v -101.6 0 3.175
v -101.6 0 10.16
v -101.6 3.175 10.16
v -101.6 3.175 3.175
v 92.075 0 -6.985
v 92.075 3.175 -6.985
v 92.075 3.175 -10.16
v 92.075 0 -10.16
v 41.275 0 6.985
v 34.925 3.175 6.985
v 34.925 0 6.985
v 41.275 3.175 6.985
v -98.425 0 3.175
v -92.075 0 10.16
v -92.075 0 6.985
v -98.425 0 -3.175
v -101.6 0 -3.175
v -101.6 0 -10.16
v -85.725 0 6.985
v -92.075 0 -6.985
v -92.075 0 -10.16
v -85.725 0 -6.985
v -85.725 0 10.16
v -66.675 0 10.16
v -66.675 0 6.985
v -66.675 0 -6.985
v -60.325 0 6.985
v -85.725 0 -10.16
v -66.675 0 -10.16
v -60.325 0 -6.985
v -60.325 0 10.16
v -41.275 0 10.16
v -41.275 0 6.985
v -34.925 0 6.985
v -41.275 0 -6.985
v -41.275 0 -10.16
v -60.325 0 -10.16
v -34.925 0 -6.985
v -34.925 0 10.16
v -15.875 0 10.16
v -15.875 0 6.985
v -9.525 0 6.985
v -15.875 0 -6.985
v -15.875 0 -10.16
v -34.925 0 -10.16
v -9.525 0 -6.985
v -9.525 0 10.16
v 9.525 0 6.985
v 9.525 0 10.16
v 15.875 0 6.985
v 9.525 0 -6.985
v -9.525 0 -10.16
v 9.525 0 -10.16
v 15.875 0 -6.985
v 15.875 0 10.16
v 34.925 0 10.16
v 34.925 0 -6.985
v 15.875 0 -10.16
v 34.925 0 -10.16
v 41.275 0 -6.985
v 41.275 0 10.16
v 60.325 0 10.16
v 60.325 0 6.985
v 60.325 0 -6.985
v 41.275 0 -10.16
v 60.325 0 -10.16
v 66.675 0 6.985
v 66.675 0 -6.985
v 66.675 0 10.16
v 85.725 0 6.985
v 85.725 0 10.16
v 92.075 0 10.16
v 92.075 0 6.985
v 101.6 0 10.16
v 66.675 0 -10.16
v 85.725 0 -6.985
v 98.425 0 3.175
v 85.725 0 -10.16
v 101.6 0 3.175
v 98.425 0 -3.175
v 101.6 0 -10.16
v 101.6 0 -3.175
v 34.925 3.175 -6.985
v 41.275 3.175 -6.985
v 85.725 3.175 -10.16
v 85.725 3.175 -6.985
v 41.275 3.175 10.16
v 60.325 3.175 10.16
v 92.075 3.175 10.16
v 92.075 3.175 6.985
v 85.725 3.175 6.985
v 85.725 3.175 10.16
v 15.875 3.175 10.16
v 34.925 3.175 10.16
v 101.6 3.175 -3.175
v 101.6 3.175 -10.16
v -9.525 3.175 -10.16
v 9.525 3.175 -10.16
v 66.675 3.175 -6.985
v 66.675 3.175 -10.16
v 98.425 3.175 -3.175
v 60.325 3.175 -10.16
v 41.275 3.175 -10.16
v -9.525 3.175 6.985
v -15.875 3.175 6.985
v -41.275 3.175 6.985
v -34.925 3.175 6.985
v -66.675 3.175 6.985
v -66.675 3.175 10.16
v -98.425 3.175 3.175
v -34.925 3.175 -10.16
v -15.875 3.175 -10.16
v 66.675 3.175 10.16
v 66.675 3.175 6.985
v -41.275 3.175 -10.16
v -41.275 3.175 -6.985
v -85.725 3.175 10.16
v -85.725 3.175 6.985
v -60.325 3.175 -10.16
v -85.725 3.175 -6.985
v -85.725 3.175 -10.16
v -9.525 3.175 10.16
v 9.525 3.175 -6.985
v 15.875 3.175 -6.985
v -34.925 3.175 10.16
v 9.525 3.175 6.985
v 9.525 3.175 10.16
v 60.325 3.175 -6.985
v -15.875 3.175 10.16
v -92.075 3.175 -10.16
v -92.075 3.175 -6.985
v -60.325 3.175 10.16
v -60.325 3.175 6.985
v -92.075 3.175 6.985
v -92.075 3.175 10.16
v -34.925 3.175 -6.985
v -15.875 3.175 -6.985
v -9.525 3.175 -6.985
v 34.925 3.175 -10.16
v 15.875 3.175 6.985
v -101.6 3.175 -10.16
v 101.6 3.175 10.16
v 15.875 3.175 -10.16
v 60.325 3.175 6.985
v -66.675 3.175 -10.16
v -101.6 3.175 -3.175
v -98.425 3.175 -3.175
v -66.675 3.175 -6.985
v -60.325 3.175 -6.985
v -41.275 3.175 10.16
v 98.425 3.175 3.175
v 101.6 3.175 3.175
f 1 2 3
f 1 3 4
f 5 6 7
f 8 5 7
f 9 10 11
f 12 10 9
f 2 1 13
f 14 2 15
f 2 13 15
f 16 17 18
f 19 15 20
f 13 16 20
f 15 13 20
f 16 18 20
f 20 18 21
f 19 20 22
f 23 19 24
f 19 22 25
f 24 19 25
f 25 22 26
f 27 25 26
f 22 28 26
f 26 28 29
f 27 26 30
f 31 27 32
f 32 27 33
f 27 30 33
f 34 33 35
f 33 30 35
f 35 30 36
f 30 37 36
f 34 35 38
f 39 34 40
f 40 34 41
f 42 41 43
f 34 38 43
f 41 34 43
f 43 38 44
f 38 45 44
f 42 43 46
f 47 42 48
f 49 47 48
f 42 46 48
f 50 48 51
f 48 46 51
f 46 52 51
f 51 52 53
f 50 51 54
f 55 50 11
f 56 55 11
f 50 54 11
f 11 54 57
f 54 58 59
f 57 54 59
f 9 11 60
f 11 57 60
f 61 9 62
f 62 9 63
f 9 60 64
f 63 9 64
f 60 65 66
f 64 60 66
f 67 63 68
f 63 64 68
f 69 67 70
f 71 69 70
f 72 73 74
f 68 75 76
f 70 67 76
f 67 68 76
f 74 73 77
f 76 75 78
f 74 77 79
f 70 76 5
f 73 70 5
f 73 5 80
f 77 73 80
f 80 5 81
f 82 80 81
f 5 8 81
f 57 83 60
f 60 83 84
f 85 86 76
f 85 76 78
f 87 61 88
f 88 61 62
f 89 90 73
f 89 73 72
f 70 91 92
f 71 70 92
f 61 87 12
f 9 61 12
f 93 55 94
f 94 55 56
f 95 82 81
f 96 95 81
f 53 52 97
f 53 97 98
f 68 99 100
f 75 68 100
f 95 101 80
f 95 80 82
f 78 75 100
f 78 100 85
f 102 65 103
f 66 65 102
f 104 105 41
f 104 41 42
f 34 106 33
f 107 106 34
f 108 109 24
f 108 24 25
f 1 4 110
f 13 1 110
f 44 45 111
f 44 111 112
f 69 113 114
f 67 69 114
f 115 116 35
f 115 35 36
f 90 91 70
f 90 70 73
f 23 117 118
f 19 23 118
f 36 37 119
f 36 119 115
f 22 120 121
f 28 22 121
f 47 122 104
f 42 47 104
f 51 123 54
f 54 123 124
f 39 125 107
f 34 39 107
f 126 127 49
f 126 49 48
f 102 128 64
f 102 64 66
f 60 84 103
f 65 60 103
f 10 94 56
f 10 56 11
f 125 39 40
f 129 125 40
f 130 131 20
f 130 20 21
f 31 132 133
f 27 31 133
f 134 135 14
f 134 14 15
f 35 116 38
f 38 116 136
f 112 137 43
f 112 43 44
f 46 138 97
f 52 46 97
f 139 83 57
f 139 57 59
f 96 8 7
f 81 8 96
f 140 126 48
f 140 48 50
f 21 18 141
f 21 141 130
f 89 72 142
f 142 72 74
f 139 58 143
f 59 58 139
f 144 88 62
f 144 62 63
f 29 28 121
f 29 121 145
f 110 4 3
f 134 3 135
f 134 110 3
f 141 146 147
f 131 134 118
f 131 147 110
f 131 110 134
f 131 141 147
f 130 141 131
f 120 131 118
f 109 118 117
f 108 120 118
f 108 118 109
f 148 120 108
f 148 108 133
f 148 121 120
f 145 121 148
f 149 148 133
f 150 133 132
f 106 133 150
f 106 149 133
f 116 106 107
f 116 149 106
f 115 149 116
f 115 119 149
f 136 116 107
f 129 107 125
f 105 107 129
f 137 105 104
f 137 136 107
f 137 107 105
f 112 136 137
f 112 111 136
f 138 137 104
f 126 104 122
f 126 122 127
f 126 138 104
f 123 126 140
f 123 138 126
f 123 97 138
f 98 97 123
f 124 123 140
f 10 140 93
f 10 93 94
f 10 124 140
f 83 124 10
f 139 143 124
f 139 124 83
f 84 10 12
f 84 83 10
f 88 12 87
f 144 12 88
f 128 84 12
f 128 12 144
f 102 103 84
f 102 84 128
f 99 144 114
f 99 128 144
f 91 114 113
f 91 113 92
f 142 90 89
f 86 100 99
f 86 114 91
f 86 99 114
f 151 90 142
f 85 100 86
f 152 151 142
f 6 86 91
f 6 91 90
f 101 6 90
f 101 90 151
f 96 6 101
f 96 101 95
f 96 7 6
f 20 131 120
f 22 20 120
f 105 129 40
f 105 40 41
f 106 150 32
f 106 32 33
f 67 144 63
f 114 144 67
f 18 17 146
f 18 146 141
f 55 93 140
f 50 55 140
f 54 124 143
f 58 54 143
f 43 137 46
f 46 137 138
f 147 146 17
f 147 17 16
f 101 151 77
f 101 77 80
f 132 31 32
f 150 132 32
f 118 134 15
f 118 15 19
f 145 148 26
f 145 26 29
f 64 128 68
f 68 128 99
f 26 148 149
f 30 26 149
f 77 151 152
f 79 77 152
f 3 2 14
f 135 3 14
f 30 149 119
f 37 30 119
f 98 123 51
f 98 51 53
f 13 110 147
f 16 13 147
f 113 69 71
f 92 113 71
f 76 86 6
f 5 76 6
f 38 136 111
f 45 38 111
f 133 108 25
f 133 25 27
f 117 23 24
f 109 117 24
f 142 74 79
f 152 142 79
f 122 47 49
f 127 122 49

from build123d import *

# Parameters (mm, degrees)
SKETCH1_W               = 203.2
SKETCH1_H               = 20.32
BOSS_EXTRUDE1_DEPTH     = 3.175
SKETCH2_W               = 6.35
SKETCH2_H               = 3.175
CUT_EXTRUDE1_DEPTH      = 103.156087557
LPATTERN1_COUNT         = 8
LPATTERN1_PITCH         = 25.4
MIRROR1_COPY_1_SKETCH_W = 6.35
MIRROR1_COPY_1_SKETCH_H = 3.175
MIRROR1_COPY_1_DEPTH    = 103.156087557
MIRROR1_COPY_2_SKETCH_W = 6.35
MIRROR1_COPY_2_SKETCH_H = 3.175
MIRROR1_COPY_2_DEPTH    = 103.156087557
MIRROR1_COPY_3_SKETCH_W = 6.35
MIRROR1_COPY_3_SKETCH_H = 3.175
MIRROR1_COPY_3_DEPTH    = 103.156087557
MIRROR1_COPY_4_SKETCH_W = 6.35
MIRROR1_COPY_4_SKETCH_H = 3.175
MIRROR1_COPY_4_DEPTH    = 103.156087557
MIRROR1_COPY_5_SKETCH_W = 6.35
MIRROR1_COPY_5_SKETCH_H = 3.175
MIRROR1_COPY_5_DEPTH    = 103.156087557
MIRROR1_COPY_6_SKETCH_W = 6.35
MIRROR1_COPY_6_SKETCH_H = 3.175
MIRROR1_COPY_6_DEPTH    = 103.156087557
MIRROR1_COPY_7_SKETCH_W = 6.35
MIRROR1_COPY_7_SKETCH_H = 3.175
MIRROR1_COPY_7_DEPTH    = 103.156087557
SKETCH3_W               = 6.35
SKETCH3_H               = 6.35
CUT_EXTRUDE2_DEPTH      = 103.156087557


with BuildPart() as part:
    # Sketch1 → Boss-Extrude1 (new body)
    with BuildSketch(Plane(origin=(0, 0, 0), x_dir=(1, 0, 0), z_dir=(0, 1, 0))):
        Rectangle(SKETCH1_W, SKETCH1_H)
    extrude(amount=BOSS_EXTRUDE1_DEPTH)

    # Sketch2 → Cut-Extrude1 (cut, through all)
    with BuildSketch(Plane(origin=(0, 3.175, 0), x_dir=(1, 0, 0), z_dir=(0, 1, 0))):
        with Locations((88.9, 8.5725)):
            Rectangle(SKETCH2_W, SKETCH2_H)
    cut_extrude1 = extrude(amount=-CUT_EXTRUDE1_DEPTH, mode=Mode.SUBTRACT)

    # LPattern1: Cut-Extrude1 ×8
    with Locations(*[(-i * LPATTERN1_PITCH, 0, 0) for i in range(1, LPATTERN1_COUNT)]):
        add(cut_extrude1, mode=Mode.SUBTRACT)

    # Mirror1: Cut-Extrude1 across plane
    add(cut_extrude1.mirror(Plane.XY), mode=Mode.SUBTRACT)

    # Mirror1 copy 1 sketch → Mirror1 copy 1 (cut, through all)
    with BuildSketch(Plane(origin=(-25.4, 3.175, 0), x_dir=(1, 0, 0), z_dir=(0, 1, 0))):
        with Locations((88.9, -8.5725)):
            Rectangle(MIRROR1_COPY_1_SKETCH_W, MIRROR1_COPY_1_SKETCH_H)
    extrude(amount=-MIRROR1_COPY_1_DEPTH, mode=Mode.SUBTRACT)

    # Mirror1 copy 2 sketch → Mirror1 copy 2 (cut, through all)
    with BuildSketch(Plane(origin=(-50.8, 3.175, 0), x_dir=(1, 0, 0), z_dir=(0, 1, 0))):
        with Locations((88.9, -8.5725)):
            Rectangle(MIRROR1_COPY_2_SKETCH_W, MIRROR1_COPY_2_SKETCH_H)
    extrude(amount=-MIRROR1_COPY_2_DEPTH, mode=Mode.SUBTRACT)

    # Mirror1 copy 3 sketch → Mirror1 copy 3 (cut, through all)
    with BuildSketch(Plane(origin=(-76.2, 3.175, 0), x_dir=(1, 0, 0), z_dir=(0, 1, 0))):
        with Locations((88.9, -8.5725)):
            Rectangle(MIRROR1_COPY_3_SKETCH_W, MIRROR1_COPY_3_SKETCH_H)
    extrude(amount=-MIRROR1_COPY_3_DEPTH, mode=Mode.SUBTRACT)

    # Mirror1 copy 4 sketch → Mirror1 copy 4 (cut, through all)
    with BuildSketch(Plane(origin=(-101.6, 3.175, 0), x_dir=(1, 0, 0), z_dir=(0, 1, 0))):
        with Locations((88.9, -8.5725)):
            Rectangle(MIRROR1_COPY_4_SKETCH_W, MIRROR1_COPY_4_SKETCH_H)
    extrude(amount=-MIRROR1_COPY_4_DEPTH, mode=Mode.SUBTRACT)

    # Mirror1 copy 5 sketch → Mirror1 copy 5 (cut, through all)
    with BuildSketch(Plane(origin=(-127, 3.175, 0), x_dir=(1, 0, 0), z_dir=(0, 1, 0))):
        with Locations((88.9, -8.5725)):
            Rectangle(MIRROR1_COPY_5_SKETCH_W, MIRROR1_COPY_5_SKETCH_H)
    extrude(amount=-MIRROR1_COPY_5_DEPTH, mode=Mode.SUBTRACT)

    # Mirror1 copy 6 sketch → Mirror1 copy 6 (cut, through all)
    with BuildSketch(Plane(origin=(-152.4, 3.175, 0), x_dir=(1, 0, 0), z_dir=(0, 1, 0))):
        with Locations((88.9, -8.5725)):
            Rectangle(MIRROR1_COPY_6_SKETCH_W, MIRROR1_COPY_6_SKETCH_H)
    extrude(amount=-MIRROR1_COPY_6_DEPTH, mode=Mode.SUBTRACT)

    # Mirror1 copy 7 sketch → Mirror1 copy 7 (cut, through all)
    with BuildSketch(Plane(origin=(-177.8, 3.175, 0), x_dir=(1, 0, 0), z_dir=(0, 1, 0))):
        with Locations((88.9, -8.5725)):
            Rectangle(MIRROR1_COPY_7_SKETCH_W, MIRROR1_COPY_7_SKETCH_H)
    extrude(amount=-MIRROR1_COPY_7_DEPTH, mode=Mode.SUBTRACT)

    # Sketch3 → Cut-Extrude2 (cut, through all)
    with BuildSketch(Plane(origin=(0, 3.175, 0), x_dir=(1, 0, 0), z_dir=(0, 1, 0))):
        with Locations((101.6, 0)):
            Rectangle(SKETCH3_W, SKETCH3_H)
        with Locations((-101.6, 0)):
            Rectangle(SKETCH3_W, SKETCH3_H)
    extrude(amount=-CUT_EXTRUDE2_DEPTH, mode=Mode.SUBTRACT)


solid = part.part
